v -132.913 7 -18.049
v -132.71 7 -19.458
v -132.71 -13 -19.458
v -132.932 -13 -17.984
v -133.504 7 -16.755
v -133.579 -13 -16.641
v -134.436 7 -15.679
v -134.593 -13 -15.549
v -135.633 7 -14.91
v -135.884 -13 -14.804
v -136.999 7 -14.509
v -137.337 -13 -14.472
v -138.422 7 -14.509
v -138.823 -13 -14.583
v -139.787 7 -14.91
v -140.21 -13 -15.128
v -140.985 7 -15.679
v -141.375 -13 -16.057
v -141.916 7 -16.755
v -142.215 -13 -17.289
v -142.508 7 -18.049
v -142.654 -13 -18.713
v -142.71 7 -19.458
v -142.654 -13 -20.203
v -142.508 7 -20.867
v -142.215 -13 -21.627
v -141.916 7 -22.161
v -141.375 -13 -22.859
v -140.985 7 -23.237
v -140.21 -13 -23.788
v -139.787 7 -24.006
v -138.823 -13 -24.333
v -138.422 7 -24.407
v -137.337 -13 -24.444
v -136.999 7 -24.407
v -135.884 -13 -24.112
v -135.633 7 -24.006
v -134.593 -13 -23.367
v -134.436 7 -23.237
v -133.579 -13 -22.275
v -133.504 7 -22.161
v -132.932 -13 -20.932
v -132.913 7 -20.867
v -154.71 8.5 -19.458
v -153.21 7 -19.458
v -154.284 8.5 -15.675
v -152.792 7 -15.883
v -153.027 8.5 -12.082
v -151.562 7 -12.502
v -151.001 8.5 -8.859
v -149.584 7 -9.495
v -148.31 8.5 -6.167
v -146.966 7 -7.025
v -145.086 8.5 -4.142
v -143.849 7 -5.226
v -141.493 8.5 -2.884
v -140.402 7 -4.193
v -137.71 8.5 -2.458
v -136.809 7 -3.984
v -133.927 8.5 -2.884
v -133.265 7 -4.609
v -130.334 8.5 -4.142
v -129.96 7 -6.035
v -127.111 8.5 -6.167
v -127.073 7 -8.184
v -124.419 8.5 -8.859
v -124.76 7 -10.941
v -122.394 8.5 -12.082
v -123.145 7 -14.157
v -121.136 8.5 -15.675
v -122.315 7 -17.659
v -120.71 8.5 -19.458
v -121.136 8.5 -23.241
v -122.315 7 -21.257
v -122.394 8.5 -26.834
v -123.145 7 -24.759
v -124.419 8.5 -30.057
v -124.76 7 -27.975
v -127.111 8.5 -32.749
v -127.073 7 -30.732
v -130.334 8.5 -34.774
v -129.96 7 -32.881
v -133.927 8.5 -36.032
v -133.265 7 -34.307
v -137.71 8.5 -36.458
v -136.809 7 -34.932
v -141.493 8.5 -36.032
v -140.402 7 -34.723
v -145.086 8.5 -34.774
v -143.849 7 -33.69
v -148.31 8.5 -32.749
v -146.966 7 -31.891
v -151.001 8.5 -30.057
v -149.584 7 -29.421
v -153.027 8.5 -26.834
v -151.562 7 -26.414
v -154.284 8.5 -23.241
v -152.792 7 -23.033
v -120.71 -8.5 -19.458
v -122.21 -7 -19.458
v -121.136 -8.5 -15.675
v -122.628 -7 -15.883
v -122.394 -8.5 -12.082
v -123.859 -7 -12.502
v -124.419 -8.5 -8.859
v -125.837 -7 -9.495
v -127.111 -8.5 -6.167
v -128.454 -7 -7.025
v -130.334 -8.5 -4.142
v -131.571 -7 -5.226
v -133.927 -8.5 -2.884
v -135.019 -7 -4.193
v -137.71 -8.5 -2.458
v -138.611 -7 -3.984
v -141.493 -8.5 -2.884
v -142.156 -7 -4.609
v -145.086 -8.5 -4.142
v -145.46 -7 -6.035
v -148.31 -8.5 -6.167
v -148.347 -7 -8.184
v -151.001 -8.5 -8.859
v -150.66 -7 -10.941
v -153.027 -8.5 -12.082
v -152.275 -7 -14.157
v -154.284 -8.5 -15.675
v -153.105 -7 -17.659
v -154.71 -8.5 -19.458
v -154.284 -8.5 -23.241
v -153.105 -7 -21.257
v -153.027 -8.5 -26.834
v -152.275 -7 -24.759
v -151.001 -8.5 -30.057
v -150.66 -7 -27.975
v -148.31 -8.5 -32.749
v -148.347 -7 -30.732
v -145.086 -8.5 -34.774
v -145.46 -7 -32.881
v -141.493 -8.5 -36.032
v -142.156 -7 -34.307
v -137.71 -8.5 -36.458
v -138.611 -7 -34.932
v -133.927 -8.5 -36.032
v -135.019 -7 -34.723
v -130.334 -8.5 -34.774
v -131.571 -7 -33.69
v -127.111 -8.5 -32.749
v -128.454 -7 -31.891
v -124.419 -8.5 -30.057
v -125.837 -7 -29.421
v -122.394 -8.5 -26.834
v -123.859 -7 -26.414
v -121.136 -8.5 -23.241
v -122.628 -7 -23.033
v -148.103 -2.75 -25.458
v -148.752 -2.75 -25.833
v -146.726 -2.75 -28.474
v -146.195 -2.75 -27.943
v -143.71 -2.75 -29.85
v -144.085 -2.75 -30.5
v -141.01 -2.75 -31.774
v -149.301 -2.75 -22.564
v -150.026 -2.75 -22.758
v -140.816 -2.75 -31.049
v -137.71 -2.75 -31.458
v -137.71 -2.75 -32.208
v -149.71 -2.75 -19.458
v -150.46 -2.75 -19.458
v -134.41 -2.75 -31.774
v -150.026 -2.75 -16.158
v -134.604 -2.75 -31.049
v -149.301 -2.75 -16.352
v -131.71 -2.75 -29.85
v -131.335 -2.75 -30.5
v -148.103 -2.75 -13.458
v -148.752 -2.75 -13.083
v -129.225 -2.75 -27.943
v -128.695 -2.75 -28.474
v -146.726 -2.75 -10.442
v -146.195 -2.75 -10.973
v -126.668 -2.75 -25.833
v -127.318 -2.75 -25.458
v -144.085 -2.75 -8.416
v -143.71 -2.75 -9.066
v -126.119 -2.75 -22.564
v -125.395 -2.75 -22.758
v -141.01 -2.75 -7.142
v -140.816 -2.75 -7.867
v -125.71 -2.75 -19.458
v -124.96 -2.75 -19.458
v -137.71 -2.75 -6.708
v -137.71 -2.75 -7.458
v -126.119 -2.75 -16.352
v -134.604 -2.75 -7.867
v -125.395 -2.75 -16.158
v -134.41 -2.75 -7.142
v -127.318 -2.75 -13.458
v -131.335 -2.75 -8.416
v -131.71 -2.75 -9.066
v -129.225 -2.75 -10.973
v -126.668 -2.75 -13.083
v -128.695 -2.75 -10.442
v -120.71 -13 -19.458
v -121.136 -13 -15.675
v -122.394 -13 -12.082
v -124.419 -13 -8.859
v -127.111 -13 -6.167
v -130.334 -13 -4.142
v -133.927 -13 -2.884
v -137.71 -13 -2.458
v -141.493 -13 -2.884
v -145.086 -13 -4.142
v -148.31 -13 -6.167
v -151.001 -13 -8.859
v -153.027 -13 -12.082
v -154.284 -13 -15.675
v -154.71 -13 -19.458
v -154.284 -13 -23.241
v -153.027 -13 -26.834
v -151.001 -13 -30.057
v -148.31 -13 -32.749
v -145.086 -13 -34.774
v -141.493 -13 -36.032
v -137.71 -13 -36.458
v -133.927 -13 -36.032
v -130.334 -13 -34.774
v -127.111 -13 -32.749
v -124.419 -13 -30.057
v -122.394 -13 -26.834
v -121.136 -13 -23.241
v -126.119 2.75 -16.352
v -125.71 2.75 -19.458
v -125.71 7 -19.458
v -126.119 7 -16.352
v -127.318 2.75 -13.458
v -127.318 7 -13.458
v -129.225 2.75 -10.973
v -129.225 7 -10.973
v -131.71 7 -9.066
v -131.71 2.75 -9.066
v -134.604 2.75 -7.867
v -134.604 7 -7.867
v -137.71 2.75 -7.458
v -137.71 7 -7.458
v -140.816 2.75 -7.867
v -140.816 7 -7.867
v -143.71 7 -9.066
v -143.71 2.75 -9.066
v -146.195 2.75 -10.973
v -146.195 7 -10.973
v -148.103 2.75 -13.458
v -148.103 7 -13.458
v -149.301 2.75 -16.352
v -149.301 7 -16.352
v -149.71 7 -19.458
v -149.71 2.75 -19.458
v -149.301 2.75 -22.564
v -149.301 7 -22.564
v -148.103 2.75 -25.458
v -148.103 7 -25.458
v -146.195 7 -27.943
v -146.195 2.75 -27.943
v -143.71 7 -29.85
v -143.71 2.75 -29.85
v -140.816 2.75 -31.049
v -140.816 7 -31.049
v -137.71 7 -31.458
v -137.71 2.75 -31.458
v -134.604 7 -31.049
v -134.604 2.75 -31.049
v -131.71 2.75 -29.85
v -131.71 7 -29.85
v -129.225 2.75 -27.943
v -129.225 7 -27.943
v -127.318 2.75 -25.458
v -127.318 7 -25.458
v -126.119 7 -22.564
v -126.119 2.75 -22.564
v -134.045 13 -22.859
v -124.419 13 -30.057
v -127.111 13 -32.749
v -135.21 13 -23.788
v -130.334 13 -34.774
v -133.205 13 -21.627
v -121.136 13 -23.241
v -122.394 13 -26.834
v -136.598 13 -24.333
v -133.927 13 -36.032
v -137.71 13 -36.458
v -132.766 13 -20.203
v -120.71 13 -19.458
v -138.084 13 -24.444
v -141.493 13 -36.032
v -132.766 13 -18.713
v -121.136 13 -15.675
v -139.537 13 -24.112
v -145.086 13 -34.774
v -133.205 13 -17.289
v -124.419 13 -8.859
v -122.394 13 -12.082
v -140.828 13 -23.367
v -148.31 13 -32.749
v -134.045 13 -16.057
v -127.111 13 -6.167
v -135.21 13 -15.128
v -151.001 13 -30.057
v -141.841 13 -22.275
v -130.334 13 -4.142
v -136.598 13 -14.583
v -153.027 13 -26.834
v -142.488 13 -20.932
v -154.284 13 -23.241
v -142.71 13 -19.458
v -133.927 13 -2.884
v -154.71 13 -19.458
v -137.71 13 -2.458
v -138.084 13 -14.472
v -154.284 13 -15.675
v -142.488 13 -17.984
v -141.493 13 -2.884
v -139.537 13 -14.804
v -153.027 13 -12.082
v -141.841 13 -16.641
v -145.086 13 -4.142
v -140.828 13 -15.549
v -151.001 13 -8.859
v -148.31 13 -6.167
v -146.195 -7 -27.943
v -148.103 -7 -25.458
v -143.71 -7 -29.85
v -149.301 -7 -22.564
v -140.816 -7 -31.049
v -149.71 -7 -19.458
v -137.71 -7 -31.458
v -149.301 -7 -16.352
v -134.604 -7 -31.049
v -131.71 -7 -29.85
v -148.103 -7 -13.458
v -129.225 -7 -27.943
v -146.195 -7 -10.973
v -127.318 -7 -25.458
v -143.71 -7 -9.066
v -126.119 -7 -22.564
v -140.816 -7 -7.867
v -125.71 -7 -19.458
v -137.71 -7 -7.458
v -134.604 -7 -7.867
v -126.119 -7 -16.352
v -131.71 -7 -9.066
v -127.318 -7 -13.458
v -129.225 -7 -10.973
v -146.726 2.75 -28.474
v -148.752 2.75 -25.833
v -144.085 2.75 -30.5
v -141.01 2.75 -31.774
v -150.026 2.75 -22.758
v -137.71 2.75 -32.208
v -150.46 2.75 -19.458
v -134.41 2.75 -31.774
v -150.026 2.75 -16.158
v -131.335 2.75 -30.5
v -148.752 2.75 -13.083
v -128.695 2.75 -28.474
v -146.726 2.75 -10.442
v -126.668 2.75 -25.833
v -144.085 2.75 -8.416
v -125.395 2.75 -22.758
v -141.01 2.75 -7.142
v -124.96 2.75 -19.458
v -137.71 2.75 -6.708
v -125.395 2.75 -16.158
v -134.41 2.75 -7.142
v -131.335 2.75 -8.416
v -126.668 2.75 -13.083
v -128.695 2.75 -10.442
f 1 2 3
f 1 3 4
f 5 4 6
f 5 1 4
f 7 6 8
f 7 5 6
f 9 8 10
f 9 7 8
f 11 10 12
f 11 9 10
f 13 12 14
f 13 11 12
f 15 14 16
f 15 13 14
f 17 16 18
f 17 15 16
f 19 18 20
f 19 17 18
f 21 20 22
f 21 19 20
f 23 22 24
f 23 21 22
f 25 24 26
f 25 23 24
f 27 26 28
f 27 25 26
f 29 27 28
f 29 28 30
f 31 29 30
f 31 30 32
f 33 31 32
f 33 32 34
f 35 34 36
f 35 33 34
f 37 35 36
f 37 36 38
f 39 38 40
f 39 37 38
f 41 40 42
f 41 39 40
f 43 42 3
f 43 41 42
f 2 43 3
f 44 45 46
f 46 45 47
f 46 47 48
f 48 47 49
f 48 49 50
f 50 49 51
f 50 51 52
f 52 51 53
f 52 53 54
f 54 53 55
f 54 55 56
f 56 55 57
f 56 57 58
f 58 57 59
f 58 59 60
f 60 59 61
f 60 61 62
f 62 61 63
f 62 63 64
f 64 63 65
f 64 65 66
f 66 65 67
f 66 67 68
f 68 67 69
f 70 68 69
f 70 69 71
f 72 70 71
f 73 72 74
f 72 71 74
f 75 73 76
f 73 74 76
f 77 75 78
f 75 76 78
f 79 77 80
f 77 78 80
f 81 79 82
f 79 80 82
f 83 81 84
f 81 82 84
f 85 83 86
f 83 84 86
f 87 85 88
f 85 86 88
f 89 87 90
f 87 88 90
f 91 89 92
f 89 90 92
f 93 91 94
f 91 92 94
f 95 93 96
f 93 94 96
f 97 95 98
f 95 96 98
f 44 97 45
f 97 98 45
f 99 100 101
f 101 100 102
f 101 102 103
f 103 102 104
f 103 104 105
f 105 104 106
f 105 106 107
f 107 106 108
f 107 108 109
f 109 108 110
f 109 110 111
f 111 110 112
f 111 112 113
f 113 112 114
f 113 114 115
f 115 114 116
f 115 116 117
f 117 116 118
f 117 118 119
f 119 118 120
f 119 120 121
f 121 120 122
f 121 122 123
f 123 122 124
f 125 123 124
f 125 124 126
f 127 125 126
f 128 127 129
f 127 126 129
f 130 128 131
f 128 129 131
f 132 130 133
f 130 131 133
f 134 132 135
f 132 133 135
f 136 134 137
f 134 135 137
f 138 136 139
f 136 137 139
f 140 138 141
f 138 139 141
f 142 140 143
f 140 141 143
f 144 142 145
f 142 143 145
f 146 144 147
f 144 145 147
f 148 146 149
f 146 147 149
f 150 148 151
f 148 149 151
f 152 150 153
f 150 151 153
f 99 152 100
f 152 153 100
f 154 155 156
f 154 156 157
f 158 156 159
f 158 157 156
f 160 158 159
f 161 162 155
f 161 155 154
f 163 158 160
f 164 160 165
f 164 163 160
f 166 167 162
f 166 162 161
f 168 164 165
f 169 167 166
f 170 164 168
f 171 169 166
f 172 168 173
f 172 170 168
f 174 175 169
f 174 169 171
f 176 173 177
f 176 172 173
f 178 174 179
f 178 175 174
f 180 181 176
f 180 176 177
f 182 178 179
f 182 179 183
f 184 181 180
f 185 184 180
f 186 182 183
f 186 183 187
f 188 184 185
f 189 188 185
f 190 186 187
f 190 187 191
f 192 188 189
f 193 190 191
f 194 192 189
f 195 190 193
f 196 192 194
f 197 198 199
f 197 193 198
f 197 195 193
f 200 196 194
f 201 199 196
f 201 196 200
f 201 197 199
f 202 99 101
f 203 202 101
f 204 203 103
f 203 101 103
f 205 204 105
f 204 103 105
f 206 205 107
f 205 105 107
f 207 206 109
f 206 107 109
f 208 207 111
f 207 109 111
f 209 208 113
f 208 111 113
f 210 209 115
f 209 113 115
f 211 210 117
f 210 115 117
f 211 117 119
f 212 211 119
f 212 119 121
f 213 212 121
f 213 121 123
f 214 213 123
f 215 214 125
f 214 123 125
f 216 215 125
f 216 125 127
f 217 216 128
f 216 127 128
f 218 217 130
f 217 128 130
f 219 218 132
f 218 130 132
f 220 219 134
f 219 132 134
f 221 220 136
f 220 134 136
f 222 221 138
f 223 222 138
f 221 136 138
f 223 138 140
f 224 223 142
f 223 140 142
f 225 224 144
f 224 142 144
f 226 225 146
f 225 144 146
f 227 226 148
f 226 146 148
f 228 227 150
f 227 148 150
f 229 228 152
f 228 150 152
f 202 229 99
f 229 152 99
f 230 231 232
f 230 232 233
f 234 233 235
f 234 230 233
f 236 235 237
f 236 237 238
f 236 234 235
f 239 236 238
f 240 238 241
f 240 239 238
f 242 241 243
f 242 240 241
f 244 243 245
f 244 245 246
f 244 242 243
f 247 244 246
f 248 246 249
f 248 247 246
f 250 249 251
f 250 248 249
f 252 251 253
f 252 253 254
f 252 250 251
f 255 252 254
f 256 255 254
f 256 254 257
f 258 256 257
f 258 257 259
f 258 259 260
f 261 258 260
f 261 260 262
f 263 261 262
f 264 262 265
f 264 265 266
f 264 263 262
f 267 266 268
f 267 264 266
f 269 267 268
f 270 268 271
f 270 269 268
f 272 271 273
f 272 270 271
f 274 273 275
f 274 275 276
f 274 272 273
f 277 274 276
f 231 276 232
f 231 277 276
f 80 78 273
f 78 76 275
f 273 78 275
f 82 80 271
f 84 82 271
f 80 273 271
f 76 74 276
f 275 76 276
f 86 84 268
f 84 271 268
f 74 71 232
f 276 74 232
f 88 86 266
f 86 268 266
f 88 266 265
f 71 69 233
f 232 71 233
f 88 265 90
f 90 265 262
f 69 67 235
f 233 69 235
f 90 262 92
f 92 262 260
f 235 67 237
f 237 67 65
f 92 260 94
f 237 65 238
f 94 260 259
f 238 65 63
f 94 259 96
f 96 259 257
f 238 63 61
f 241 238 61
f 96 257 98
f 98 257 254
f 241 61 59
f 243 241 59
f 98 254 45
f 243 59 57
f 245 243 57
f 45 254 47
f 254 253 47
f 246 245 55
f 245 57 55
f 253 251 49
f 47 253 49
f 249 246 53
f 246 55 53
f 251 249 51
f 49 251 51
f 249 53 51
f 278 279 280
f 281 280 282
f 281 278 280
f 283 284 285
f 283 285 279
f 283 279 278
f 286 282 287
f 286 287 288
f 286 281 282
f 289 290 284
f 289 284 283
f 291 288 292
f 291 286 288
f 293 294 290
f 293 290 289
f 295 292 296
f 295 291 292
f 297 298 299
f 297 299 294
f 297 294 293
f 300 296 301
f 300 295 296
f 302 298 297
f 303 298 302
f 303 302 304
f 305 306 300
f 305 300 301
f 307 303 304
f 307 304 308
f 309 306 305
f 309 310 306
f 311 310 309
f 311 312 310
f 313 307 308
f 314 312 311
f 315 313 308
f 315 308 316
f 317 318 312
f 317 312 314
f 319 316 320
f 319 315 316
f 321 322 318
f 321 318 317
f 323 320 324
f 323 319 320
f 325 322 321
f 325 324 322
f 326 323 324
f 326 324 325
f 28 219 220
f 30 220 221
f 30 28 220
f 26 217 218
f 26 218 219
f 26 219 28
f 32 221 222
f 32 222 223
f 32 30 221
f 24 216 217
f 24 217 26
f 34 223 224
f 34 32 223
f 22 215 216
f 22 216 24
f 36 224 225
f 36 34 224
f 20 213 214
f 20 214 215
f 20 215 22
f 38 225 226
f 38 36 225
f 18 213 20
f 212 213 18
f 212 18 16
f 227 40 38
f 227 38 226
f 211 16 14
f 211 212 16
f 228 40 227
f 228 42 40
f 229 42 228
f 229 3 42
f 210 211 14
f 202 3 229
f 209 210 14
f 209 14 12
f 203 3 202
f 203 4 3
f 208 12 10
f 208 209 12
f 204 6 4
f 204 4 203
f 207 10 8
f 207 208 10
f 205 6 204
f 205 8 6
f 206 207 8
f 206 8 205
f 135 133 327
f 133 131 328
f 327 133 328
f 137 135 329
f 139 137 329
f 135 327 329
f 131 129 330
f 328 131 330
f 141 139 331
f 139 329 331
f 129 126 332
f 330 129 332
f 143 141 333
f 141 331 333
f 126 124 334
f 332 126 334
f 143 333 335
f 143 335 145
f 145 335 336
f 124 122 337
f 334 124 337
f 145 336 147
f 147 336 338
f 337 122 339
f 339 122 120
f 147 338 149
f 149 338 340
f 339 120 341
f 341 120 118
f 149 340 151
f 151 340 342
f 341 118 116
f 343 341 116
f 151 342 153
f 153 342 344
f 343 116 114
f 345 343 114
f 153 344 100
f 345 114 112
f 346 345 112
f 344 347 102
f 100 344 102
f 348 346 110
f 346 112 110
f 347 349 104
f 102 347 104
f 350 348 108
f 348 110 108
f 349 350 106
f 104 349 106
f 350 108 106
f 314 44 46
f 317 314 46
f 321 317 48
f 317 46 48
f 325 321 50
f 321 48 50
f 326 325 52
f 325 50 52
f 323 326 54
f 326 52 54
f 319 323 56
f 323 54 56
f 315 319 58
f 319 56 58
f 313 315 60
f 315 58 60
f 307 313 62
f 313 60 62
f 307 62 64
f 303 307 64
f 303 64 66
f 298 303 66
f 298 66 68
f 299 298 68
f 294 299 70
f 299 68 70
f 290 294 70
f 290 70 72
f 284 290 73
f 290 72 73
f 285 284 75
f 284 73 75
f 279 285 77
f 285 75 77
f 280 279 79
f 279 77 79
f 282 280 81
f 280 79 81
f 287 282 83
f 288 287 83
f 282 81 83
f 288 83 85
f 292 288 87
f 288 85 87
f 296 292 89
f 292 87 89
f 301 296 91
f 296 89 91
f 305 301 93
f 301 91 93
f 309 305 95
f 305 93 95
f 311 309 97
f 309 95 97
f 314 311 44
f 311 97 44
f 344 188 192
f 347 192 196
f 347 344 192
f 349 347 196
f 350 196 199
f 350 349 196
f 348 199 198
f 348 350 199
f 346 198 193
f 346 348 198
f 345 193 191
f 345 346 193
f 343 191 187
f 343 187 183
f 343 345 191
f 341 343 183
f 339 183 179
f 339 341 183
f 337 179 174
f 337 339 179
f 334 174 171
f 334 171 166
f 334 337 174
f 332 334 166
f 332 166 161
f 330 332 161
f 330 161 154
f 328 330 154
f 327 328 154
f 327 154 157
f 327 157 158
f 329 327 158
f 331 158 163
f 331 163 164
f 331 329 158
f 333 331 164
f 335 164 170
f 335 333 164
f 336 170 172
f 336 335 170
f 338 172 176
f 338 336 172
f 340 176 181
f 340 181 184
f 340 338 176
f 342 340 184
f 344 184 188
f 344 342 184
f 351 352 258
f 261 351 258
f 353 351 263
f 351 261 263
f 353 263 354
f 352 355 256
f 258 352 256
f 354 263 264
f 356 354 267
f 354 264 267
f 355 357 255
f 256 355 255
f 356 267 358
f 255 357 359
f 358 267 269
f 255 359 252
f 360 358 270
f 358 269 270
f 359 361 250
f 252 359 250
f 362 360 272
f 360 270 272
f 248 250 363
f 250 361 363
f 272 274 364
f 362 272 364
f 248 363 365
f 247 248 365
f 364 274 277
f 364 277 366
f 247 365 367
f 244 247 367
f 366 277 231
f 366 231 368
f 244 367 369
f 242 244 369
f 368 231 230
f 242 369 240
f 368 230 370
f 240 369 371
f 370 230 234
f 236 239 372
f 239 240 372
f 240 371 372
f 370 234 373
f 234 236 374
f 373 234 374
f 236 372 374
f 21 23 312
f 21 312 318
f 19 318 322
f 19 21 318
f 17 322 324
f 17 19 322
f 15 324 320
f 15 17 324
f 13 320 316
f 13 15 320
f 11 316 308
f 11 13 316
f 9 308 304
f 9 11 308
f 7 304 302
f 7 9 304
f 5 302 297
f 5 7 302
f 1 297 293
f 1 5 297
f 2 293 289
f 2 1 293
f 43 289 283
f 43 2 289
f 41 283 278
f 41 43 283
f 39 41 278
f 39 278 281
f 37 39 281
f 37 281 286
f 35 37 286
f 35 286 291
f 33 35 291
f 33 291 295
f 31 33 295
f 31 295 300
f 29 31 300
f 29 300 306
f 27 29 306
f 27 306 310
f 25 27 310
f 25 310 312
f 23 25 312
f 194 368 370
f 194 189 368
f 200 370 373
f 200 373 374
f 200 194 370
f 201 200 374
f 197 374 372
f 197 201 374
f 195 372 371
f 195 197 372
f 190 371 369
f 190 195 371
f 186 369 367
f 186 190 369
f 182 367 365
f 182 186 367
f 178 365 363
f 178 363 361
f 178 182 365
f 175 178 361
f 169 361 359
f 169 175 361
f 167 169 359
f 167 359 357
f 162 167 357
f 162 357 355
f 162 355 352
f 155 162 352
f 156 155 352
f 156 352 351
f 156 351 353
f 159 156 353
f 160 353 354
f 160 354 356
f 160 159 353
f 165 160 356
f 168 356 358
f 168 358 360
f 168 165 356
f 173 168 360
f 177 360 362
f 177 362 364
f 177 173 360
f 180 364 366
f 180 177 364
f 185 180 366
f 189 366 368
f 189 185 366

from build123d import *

# Parameters (mm, degrees)
F0_R     = 12
F0_R_2   = 5
F1_DEPTH = 7
F0_R_3   = 12.75
F2_DEPTH = 2.75
F3_R     = 17
F3_R_2   = 5
F4_DEPTH = 6
F5_SIZE  = 1.5
F6_R     = 17
F6_R_2   = 12
F6_R_3   = 5
F7_DEPTH = 6
F8_SIZE  = 1.5


with BuildPart() as f1:
    # F0 (on Front) → F1 (new body, symmetric)
    with BuildSketch(Plane.XZ):
        with Locations((-137.7102136612, -19.4580089301)):
            Circle(F0_R)
        with Locations((-137.7102136612, -19.4580089301)):
            Circle(F0_R_2, mode=Mode.SUBTRACT)
    extrude(amount=F1_DEPTH, both=True)

    # F0 (on Front) → F2 (join, symmetric)
    with BuildSketch(Plane.XZ):
        with Locations((-137.7102136612, -19.4580089301)):
            Circle(F0_R_3)
        with Locations((-137.7102136612, -19.4580089301)):
            Circle(F0_R, mode=Mode.SUBTRACT)
    extrude(amount=F2_DEPTH, both=True)

    # F3 (on face) → F4 (join)
    with BuildSketch(Plane.XZ.offset(7)):
        with Locations((-137.7102136612, -19.4580089301)):
            Circle(F3_R)
        with Locations((-137.7102136612, -19.4580089301)):
            Circle(F3_R_2, mode=Mode.SUBTRACT)
    extrude(amount=F4_DEPTH)

    # F5
    f5_edges = [f1.edges().sort_by_distance(p)[0] for p in [
        (-154.710214, -7, -19.458009),
    ]]
    chamfer(f5_edges, length=F5_SIZE)

    # F6 (on face) → F7 (join)
    with BuildSketch(Plane(origin=(0, 7, 0), x_dir=(-1, 0, 0), z_dir=(0, 1, 0))):
        with Locations((137.7102136612, -19.4580089301)):
            Circle(F6_R)
        with Locations((137.7102136612, -19.4580089301)):
            Circle(F6_R_2, mode=Mode.SUBTRACT)
        with Locations((137.7102136612, -19.4580089301)):
            Circle(F6_R_2)
        with Locations((137.7102136612, -19.4580089301)):
            Circle(F6_R_3, mode=Mode.SUBTRACT)
    extrude(amount=F7_DEPTH)

    # F8
    f8_edges = [f1.edges().sort_by_distance(p)[0] for p in [
        (-120.710214, 7, -19.458009),
    ]]
    chamfer(f8_edges, length=F8_SIZE)


solid = f1.part
